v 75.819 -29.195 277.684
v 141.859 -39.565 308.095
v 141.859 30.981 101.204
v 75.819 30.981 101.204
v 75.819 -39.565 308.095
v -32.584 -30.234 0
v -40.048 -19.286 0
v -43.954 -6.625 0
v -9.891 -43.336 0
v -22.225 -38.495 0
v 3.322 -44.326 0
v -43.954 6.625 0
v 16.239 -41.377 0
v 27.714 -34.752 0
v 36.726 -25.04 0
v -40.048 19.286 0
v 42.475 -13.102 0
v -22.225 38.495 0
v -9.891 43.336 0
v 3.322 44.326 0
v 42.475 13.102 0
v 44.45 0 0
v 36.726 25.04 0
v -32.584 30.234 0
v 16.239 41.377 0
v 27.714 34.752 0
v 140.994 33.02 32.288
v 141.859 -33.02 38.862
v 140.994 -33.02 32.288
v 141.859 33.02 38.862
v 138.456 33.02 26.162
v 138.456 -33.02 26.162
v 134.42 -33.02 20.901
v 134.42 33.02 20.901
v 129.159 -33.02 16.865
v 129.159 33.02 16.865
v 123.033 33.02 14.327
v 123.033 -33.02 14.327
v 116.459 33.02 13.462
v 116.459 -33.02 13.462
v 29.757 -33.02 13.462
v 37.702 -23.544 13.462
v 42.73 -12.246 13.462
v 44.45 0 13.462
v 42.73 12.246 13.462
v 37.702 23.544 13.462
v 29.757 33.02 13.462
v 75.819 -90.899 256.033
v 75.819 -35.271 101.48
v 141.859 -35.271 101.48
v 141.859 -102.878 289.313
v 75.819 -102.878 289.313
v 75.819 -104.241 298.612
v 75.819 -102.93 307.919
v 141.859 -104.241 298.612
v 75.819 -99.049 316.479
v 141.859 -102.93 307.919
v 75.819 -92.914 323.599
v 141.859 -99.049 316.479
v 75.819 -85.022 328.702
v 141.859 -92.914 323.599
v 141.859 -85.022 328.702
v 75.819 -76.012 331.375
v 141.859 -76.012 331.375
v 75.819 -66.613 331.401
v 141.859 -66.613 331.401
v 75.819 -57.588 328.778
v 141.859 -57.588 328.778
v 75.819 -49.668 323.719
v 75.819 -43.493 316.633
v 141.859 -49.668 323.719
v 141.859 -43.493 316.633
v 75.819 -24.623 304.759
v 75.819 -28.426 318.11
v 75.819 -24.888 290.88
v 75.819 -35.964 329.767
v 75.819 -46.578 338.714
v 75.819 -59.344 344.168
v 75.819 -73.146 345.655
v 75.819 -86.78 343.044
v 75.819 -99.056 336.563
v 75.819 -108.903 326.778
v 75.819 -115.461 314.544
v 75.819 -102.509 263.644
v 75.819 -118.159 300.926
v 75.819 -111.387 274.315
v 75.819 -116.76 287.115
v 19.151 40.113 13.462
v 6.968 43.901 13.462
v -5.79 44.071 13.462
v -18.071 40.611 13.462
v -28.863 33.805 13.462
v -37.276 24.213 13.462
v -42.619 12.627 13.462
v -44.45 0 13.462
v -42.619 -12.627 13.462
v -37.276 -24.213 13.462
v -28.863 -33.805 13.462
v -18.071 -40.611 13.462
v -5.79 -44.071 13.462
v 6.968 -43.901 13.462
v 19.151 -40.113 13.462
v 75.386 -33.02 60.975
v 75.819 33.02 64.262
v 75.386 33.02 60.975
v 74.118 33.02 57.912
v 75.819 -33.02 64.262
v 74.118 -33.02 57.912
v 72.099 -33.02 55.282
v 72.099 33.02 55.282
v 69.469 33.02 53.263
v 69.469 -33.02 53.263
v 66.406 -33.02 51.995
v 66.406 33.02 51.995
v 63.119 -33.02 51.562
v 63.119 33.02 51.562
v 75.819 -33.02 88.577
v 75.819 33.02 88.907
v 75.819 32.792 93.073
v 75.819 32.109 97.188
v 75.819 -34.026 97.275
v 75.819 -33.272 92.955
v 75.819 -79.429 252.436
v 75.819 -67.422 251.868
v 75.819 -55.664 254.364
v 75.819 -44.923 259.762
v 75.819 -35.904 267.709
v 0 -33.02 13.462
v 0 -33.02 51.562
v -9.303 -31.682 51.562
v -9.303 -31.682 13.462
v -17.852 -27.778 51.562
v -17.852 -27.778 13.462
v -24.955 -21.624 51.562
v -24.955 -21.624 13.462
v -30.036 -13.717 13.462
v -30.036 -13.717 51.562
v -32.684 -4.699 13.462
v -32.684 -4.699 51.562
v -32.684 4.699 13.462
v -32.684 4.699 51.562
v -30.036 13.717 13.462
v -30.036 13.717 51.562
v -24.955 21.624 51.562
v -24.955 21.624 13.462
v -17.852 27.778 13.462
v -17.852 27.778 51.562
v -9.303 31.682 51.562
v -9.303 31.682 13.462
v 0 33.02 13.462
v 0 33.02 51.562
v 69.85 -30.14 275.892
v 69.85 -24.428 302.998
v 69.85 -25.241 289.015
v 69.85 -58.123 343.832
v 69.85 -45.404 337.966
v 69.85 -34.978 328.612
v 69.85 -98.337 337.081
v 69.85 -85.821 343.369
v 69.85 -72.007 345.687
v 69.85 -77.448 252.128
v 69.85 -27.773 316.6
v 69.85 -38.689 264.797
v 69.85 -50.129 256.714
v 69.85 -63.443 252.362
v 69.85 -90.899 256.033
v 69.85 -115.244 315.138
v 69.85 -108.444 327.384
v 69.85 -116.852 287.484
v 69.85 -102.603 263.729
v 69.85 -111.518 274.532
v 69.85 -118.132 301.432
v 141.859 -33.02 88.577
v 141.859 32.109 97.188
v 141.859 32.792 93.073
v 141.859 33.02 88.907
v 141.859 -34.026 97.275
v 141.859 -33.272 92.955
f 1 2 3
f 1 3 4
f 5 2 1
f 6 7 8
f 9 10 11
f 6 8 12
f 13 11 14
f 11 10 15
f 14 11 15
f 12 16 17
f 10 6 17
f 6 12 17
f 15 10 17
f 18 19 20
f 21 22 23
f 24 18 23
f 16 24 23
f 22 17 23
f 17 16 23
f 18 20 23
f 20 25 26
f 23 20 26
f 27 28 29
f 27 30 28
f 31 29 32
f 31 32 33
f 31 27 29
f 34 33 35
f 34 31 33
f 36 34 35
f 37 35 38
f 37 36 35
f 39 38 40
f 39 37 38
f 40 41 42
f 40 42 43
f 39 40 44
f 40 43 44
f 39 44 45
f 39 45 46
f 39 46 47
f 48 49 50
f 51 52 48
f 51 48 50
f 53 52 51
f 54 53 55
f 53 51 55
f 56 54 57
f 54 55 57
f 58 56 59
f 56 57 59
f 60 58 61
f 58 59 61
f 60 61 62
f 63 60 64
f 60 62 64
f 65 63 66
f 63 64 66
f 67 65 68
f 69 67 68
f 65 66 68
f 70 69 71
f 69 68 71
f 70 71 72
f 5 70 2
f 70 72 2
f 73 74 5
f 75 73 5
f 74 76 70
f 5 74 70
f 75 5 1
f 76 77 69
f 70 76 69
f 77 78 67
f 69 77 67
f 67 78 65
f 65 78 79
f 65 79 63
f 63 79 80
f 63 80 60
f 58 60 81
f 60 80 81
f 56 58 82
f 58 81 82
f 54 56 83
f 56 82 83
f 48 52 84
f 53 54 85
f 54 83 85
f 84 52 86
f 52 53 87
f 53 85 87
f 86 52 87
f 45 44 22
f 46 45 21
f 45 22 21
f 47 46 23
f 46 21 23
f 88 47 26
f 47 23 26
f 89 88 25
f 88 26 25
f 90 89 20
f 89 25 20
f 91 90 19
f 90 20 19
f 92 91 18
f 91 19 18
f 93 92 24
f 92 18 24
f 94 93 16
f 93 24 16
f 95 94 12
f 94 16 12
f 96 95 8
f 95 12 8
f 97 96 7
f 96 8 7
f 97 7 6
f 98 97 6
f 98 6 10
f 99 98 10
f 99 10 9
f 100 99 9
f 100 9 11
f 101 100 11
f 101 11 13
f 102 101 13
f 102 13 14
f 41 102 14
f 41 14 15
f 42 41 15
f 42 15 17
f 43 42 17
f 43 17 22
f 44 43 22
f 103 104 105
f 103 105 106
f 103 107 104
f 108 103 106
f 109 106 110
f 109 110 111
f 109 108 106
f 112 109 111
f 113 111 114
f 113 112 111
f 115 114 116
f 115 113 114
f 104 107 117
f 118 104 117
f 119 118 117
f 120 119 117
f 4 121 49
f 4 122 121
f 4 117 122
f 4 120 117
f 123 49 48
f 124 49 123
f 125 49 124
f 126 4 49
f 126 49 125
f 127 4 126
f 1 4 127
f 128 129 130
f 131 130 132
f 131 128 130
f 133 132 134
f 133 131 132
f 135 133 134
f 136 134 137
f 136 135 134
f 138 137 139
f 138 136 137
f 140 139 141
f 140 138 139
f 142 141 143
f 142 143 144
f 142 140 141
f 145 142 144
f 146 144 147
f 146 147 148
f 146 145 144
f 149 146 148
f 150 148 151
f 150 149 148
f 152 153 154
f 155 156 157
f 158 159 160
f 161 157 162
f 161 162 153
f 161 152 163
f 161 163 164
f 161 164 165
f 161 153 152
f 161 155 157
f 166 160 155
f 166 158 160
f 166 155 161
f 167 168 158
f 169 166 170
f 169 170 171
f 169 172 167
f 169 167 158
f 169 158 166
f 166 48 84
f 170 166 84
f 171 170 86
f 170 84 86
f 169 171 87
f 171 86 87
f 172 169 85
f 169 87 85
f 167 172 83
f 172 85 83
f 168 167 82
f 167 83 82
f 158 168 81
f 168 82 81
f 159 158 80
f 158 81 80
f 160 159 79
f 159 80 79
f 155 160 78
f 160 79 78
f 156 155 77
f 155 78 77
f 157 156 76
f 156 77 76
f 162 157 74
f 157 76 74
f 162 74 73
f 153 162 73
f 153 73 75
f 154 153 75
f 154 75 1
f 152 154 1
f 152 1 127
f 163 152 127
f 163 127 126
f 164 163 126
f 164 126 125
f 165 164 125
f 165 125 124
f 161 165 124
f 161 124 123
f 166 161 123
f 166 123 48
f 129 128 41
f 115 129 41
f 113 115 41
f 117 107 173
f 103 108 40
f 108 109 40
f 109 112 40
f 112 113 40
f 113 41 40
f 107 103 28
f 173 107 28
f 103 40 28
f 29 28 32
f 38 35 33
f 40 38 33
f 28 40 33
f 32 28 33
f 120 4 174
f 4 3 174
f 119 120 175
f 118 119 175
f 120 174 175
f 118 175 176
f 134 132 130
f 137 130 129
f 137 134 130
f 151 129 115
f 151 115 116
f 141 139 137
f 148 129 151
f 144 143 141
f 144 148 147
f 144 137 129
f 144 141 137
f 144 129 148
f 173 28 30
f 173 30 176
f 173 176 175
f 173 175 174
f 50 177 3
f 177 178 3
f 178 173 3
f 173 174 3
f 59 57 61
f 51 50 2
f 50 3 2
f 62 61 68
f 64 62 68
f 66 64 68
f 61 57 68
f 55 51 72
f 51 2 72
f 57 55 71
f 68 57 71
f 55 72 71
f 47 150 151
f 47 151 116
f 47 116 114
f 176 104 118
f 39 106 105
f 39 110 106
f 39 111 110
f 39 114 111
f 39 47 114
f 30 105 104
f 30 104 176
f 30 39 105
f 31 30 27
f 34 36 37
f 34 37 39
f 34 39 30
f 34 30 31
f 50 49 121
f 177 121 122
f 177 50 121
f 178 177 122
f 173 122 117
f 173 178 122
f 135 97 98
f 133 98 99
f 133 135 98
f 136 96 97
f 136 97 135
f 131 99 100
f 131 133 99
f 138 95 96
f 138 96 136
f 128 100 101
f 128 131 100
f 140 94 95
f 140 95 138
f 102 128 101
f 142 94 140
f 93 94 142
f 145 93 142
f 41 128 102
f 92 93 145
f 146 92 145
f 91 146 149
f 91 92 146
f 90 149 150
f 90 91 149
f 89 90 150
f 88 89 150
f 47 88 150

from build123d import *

# Parameters (mm, degrees)
SKETCH2_R           = 44.45
BOSS_EXTRUDE1_DEPTH = 13.462
BOSS_EXTRUDE2_DEPTH = 38.1
SKETCH4_W           = 38.1
SKETCH4_H           = 66.04
BOSS_EXTRUDE3_DEPTH = 141.859
SKETCH5_W           = 66.04
SKETCH5_H           = 66.04
BOSS_EXTRUDE4_DEPTH = 43.6626
FILLET1_R           = 25.4
FILLET2_R           = 12.7
FILLET4_R           = 38.1
BOSS_EXTRUDE5_DEPTH = 66.04
SKETCH12_R          = 46.99
BOSS_EXTRUDE6_DEPTH = 5.969


with BuildPart() as part:
    # Sketch2 → Boss-Extrude1 (new body)
    with BuildSketch(Plane.XY):
        Circle(SKETCH2_R)
    extrude(amount=BOSS_EXTRUDE1_DEPTH)

    # Sketch3 → Boss-Extrude2 (add)
    with BuildSketch(Plane.XY.offset(13.462)):
        with BuildLine():
            Line((0, 33.02), (0, -33.02))
            ThreePointArc((0, -33.02), (-33.02, 0), (0, 33.02))
        make_face()
    extrude(amount=BOSS_EXTRUDE2_DEPTH)

    # Sketch4 → Boss-Extrude3 (add)
    with BuildSketch(Plane(origin=(0, 0, 0), x_dir=(0, 0, -1), z_dir=(1, 0, 0))):
        with Locations((-32.512, 0)):
            Rectangle(SKETCH4_W, SKETCH4_H)
    extrude(amount=BOSS_EXTRUDE3_DEPTH)

    # Sketch5 → Boss-Extrude4 (add)
    with BuildSketch(Plane(origin=(0, 18.542, 51.562), x_dir=(1, 0, 0), z_dir=(0, 0, -1))):
        with Locations((108.839, 18.542)):
            Rectangle(SKETCH5_W, SKETCH5_H)
    extrude(amount=-BOSS_EXTRUDE4_DEPTH)

    # Fillet1
    fillet1_edges = [part.edges().sort_by_distance(p)[0] for p in [
        (141.859, 0, 13.462),
    ]]
    fillet(fillet1_edges, radius=FILLET1_R)

    # Fillet2
    fillet2_edges = [part.edges().sort_by_distance(p)[0] for p in [
        (75.819, 0, 51.562),
    ]]
    fillet(fillet2_edges, radius=FILLET2_R)

    # Sketch8 → Loft1 section 0
    with BuildSketch(Plane(origin=(0, 0, 95.2246), x_dir=(0, -1, 0), z_dir=(0, 0, 1))):
        with BuildLine():
            Line((-33.02, 75.819), (33.02, 75.819))
            Line((33.02, 75.819), (33.02, 141.859))
            Line((33.02, 141.859), (-33.02, 141.859))
            Line((-33.02, 141.859), (-33.02, 75.819))
        make_face()
    # Sketch10 → Loft1 section 1
    with BuildSketch(Plane(origin=(0, -87.20411689, 293.962783253), x_dir=(-1, 0, 0), z_dir=(0, -0.2844002167201493, 0.958705646551397))):
        with BuildLine():
            Line((-141.859, 16.349067741), (-75.819, 16.349067741))
            Line((-75.819, 16.349067741), (-75.819, -49.690932259))
            Line((-75.819, -49.690932259), (-141.859, -49.690932259))
            Line((-141.859, -49.690932259), (-141.859, 16.349067741))
        make_face()
    loft()

    # Fillet4
    fillet4_edges = [part.edges().sort_by_distance(p)[0] for p in [
        (108.839, 33.02, 95.2246),
        (108.839, -33.02, 95.2246),
    ]]
    fillet(fillet4_edges, radius=FILLET4_R)

    # Sketch11 → Boss-Extrude5 (add)
    with BuildSketch(Plane(origin=(141.859, 0, 0), x_dir=(0, 0, -1), z_dir=(1, 0, 0))):
        with BuildLine():
            Line((-308.094895156, -39.565139551), (-289.313104844, -102.878060449))
            ThreePointArc((-289.313104844, -102.878060449), (-330.360460449, -80.612495156), (-308.094895156, -39.565139551))
        make_face()
    extrude(amount=-BOSS_EXTRUDE5_DEPTH)

    # Sketch12 → Boss-Extrude6 (add)
    with BuildSketch(Plane.ZY.offset(-75.819)):
        with Locations((298.704, -71.2216)):
            Circle(SKETCH12_R)
    extrude(amount=BOSS_EXTRUDE6_DEPTH)


solid = part.part
